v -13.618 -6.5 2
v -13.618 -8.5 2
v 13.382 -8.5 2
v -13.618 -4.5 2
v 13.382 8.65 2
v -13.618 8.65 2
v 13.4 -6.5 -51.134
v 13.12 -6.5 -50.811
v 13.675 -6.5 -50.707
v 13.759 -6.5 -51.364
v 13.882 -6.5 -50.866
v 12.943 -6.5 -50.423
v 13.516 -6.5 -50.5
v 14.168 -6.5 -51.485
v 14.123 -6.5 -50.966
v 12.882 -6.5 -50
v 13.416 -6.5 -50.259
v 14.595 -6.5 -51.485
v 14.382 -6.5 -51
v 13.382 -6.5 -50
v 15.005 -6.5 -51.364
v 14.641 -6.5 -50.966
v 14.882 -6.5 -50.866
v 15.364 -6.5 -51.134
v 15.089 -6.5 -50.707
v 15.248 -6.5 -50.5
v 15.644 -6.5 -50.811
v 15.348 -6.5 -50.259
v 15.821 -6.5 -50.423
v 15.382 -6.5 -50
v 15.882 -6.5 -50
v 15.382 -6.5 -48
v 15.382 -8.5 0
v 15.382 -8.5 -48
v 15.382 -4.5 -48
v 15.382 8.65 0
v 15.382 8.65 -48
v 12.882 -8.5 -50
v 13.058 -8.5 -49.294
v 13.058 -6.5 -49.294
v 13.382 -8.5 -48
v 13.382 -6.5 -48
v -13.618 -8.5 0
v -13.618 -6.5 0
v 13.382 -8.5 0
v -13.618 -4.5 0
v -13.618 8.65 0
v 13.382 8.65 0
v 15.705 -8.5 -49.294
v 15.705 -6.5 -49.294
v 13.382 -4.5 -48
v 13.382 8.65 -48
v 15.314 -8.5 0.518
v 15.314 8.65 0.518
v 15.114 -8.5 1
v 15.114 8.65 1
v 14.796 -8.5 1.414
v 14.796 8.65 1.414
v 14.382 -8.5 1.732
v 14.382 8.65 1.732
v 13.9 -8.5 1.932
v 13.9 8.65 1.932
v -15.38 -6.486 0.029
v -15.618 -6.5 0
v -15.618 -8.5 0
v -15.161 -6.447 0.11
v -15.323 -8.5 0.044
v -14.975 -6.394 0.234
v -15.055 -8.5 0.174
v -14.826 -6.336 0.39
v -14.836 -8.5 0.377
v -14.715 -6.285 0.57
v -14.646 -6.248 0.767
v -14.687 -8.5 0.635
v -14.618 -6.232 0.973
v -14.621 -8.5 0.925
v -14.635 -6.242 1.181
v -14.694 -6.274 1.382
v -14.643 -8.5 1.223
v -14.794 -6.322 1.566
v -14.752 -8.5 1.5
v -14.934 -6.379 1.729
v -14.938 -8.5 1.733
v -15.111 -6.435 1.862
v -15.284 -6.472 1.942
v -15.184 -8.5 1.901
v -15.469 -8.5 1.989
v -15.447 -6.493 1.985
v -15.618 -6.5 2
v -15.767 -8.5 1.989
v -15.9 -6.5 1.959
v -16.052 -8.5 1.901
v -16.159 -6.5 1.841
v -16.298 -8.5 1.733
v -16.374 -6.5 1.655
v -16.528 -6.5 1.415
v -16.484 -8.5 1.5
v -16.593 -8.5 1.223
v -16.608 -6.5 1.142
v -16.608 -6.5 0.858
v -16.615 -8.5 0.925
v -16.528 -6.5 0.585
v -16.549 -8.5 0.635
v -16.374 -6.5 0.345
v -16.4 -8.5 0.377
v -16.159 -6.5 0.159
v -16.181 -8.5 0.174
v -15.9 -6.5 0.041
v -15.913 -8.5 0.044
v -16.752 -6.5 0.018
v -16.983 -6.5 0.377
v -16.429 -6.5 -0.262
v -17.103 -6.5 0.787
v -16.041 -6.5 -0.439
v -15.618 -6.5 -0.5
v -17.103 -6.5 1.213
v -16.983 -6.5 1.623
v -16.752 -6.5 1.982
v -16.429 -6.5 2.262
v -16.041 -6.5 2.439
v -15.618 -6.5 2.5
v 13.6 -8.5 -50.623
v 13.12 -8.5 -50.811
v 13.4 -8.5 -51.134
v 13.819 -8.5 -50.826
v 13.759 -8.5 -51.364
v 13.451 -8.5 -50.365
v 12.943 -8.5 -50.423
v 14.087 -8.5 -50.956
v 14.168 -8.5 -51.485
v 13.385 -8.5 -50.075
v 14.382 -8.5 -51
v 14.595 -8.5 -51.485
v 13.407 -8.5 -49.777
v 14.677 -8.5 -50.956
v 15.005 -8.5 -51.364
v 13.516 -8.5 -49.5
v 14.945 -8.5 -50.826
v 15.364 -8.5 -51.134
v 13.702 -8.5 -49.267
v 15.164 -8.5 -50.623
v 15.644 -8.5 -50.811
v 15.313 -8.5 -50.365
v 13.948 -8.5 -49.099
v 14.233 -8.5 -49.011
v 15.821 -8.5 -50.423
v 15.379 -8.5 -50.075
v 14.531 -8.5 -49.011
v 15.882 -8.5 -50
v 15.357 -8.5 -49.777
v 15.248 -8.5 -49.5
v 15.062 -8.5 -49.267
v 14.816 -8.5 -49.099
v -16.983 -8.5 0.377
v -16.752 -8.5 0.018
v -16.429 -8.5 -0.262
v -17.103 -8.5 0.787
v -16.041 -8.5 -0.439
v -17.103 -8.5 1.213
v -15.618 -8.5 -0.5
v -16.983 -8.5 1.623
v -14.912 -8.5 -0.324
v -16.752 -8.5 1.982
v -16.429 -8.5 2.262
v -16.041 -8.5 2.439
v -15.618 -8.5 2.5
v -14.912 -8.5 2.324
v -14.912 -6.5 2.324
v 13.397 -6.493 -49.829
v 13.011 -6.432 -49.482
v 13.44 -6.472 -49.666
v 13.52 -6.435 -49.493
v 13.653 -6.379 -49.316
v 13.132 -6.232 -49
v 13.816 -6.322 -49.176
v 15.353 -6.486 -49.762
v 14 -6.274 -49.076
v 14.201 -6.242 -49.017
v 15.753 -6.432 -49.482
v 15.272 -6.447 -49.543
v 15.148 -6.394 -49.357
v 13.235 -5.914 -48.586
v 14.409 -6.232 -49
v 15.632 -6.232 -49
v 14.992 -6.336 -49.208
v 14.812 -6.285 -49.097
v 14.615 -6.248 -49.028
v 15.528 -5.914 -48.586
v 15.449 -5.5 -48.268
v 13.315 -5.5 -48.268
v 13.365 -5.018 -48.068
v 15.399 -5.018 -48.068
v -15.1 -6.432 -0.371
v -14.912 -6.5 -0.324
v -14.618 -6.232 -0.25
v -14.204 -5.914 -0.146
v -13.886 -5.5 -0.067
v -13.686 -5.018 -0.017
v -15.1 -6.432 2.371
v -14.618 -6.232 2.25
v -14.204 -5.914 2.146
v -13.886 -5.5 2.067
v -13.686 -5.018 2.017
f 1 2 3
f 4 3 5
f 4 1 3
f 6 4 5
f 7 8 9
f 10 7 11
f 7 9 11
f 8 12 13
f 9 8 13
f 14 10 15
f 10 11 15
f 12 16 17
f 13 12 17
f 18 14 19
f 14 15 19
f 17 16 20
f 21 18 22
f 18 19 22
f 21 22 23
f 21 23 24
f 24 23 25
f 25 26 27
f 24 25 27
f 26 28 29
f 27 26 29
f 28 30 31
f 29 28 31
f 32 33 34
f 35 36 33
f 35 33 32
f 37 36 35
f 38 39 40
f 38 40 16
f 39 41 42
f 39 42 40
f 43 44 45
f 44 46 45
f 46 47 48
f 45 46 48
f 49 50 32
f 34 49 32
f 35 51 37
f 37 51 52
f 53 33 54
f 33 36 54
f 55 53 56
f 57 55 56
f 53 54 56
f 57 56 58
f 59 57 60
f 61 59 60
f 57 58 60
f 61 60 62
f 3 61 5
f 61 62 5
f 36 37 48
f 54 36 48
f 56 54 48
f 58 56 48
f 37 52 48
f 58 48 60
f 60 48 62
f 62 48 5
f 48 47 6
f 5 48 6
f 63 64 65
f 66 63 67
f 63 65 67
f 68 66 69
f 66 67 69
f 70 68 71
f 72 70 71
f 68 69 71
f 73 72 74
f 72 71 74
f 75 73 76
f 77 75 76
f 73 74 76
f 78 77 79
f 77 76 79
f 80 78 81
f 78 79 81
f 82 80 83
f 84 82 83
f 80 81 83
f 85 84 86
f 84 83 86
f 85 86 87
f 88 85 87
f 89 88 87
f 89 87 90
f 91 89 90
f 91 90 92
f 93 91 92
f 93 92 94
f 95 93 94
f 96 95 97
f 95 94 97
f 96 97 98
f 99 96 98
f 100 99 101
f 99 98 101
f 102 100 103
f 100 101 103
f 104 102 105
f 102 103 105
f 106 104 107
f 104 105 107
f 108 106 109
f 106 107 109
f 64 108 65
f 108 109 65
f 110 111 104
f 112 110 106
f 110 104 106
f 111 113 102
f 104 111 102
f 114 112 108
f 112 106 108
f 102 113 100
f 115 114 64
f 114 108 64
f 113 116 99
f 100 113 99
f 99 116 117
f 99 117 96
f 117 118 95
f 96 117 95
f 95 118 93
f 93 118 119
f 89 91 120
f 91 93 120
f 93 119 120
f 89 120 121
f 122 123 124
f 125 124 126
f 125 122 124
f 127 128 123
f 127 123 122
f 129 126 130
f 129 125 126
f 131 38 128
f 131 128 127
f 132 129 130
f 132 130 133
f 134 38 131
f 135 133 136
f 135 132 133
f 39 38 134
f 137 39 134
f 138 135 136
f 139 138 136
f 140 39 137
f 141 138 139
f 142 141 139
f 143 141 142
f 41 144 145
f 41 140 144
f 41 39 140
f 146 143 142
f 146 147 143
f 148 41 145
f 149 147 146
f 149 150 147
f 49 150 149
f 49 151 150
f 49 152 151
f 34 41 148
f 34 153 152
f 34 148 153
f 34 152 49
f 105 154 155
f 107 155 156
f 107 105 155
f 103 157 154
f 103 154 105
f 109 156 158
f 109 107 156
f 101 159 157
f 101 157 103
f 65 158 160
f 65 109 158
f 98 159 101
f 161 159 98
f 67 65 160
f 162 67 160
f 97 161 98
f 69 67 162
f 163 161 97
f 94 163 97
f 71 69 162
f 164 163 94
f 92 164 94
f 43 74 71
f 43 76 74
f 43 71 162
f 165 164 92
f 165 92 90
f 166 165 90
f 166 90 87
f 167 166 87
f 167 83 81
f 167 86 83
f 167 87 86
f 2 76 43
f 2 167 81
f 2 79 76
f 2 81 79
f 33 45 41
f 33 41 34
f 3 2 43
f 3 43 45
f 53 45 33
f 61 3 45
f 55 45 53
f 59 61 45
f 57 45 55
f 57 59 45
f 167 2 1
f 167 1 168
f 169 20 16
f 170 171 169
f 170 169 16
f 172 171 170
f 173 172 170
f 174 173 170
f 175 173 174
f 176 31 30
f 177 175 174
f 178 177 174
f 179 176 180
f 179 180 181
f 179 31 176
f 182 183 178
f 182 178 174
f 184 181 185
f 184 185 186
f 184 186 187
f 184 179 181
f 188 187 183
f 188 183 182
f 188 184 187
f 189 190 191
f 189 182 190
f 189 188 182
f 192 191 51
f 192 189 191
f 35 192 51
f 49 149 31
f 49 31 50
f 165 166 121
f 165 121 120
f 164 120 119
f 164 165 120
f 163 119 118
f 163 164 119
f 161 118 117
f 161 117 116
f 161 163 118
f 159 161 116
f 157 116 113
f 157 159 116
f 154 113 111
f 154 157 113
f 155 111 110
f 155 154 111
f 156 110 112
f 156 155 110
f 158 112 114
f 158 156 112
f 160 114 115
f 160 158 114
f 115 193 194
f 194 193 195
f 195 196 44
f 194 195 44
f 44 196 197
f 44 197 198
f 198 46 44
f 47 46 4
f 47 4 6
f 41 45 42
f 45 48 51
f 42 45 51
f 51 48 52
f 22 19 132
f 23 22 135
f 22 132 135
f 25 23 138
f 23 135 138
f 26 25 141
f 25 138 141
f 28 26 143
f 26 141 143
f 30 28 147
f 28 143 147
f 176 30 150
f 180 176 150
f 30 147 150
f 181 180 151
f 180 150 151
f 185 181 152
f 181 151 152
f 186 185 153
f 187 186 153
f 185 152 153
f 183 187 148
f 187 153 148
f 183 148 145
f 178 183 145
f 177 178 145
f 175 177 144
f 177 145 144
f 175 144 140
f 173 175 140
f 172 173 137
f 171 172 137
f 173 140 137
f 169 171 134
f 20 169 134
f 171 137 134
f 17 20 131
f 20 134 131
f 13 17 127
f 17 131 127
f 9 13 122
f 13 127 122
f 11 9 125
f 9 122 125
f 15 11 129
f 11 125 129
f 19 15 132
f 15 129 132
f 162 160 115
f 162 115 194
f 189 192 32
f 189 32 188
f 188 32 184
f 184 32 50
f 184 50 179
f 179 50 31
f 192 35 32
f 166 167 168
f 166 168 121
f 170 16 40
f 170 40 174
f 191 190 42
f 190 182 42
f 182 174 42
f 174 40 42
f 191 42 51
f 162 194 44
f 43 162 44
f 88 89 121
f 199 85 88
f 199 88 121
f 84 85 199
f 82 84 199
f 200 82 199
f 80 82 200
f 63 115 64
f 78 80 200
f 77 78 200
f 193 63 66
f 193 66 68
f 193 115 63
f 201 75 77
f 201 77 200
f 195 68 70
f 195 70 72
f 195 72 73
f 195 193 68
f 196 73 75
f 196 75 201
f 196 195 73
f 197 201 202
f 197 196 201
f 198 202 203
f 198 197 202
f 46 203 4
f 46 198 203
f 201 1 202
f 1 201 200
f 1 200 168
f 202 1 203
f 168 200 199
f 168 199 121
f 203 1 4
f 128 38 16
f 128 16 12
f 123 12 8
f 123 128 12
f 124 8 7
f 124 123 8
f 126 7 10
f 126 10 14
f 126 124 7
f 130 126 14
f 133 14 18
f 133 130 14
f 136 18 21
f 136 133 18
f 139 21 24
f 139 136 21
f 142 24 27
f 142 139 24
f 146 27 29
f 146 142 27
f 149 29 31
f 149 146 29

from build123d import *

# Parameters (mm, degrees)
SKETCH2_W           = 27
SKETCH2_H           = 17.15
BOSS_EXTRUDE1_DEPTH = 2
SKETCH3_W           = 48
SKETCH3_H           = 17.15
SKETCH3_W_2         = 2
BOSS_EXTRUDE2_DEPTH = 2
FILLET1_R           = 2
SKETCH4_R           = 1
BOSS_EXTRUDE3_DEPTH = 2
FILLET2_R           = 2


with BuildPart() as part:
    # Sketch2 → Boss-Extrude1 (new body)
    with BuildSketch(Plane.XY):
        with Locations((-0.118075802, 0.075)):
            Rectangle(SKETCH2_W, SKETCH2_H)
    extrude(amount=BOSS_EXTRUDE1_DEPTH)

    # Sketch3 → Boss-Extrude2 (add)
    with BuildSketch(Plane(origin=(13.381924198, 0, 0), x_dir=(0, 0, -1), z_dir=(1, 0, 0))):
        with Locations((24, 0.075)):
            Rectangle(SKETCH3_W, SKETCH3_H)
        with Locations((-1, 0.075)):
            Rectangle(SKETCH3_W_2, SKETCH3_H)
    extrude(amount=BOSS_EXTRUDE2_DEPTH)

    # Fillet1
    fillet1_edges = [part.edges().sort_by_distance(p)[0] for p in [
        (15.381924198, 0.075, 2),
    ]]
    fillet(fillet1_edges, radius=FILLET1_R)

    # Sketch4 → Boss-Extrude3 (add)
    # profile 1 of 4: a face of its own
    with BuildSketch(Plane.XZ.offset(8.5)):
        with BuildLine():
            Line((13.381924198, -48), (13.058394786, -49.294117647))
            ThreePointArc((13.058394786, -49.294117647), (14.381924198, -48.5), (15.70545361, -49.294117647))
            Line((15.70545361, -49.294117647), (15.381924198, -48))
            Line((15.381924198, -48), (13.381924198, -48))
        make_face()
    # profile 2 of 4: a face of its own
    with BuildSketch(Plane.XZ.offset(8.5)):
        with BuildLine():
            Line((13.058394786, -49.294117647), (12.881924198, -50))
            ThreePointArc((12.881924198, -50), (14.381924198, -51.5), (15.881924198, -50))
            Line((15.881924198, -50), (15.70545361, -49.294117647))
            ThreePointArc((15.70545361, -49.294117647), (14.381924198, -48.5), (13.058394786, -49.294117647))
        make_face()
        with Locations(Location((14.381924198, -50, 0), (0, 0, 270))):
            Circle(SKETCH4_R, mode=Mode.SUBTRACT)
    # profile 3 of 4: a face of its own
    with BuildSketch(Plane.XZ.offset(8.5)):
        with BuildLine():
            Line((-15.618075802, -0.5), (-14.912193449, -0.323529412))
            ThreePointArc((-14.912193449, -0.323529412), (-14.331836413, 0.228256367), (-14.118075802, 1))
            ThreePointArc((-14.118075802, 1), (-14.331836413, 1.771743633), (-14.912193449, 2.323529412))
            Line((-14.912193449, 2.323529412), (-15.618075802, 2.5))
            ThreePointArc((-15.618075802, 2.5), (-17.118075802, 1), (-15.618075802, -0.5))
        make_face()
        with Locations(Location((-15.618075802, 1, 0), (0, 0, 270))):
            Circle(SKETCH4_R, mode=Mode.SUBTRACT)
    # profile 4 of 4: a face of its own
    with BuildSketch(Plane.XZ.offset(8.5)):
        with BuildLine():
            Line((-14.912193449, -0.323529412), (-13.618075802, 0))
            Line((-13.618075802, 0), (-13.618075802, 2))
            Line((-13.618075802, 2), (-14.912193449, 2.323529412))
            ThreePointArc((-14.912193449, 2.323529412), (-14.331836413, 1.771743633), (-14.118075802, 1))
            ThreePointArc((-14.118075802, 1), (-14.331836413, 0.228256367), (-14.912193449, -0.323529412))
        make_face()
    extrude(amount=-BOSS_EXTRUDE3_DEPTH)

    # Fillet2
    # the kernel refuses this fillet: 2 mm, written as the material it adds along each edge
    with BuildSketch(Plane(origin=(-13.618075802, -6.5, -5), x_dir=(0, 1, 0), z_dir=(0, 0, 1))) as fillet2_piece_1_section:
        with BuildLine():
            CenterArc((FILLET2_R, FILLET2_R), FILLET2_R, 180, 90)
            Line((0, FILLET2_R), (0, 0))
            Line((0, 0), (FILLET2_R, 0))
        make_face()
    fillet2_piece_1 = extrude(amount=12, mode=Mode.PRIVATE)
    fillet2_piece_1 = split(fillet2_piece_1, bisect_by=Plane(origin=(-13.669858881, -6.170840666, 2.01294577), z_dir=(-0.24253562503633297, 0, -0.9701425001453319)), keep=Keep.TOP, mode=Mode.PRIVATE)
    fillet2_piece_1 = split(fillet2_piece_1, bisect_by=Plane(origin=(-14.177655248, -6.170840666, -0.139894862), z_dir=(-0.24253562503633314, 0, 0.9701425001453319)), keep=Keep.TOP, mode=Mode.PRIVATE)
    fillet2_piece_1 = fillet2_piece_1 - Plane(origin=(-15.618075802, -6.170840666, 1), x_dir=(0, 0, -1), z_dir=(0, -1, 0)) * Cylinder(1, 32, mode=Mode.PRIVATE)
    add(fillet2_piece_1)
    with BuildSketch(Plane(origin=(20.381924198, -6.5, -48), x_dir=(0, 1, 0), z_dir=(-1, 0, 0))) as fillet2_piece_2_section:
        with BuildLine():
            CenterArc((FILLET2_R, FILLET2_R), FILLET2_R, 180, 90)
            Line((0, FILLET2_R), (0, 0))
            Line((0, 0), (FILLET2_R, 0))
        make_face()
    fillet2_piece_2 = extrude(amount=12, mode=Mode.PRIVATE)
    fillet2_piece_2 = split(fillet2_piece_2, bisect_by=Plane(origin=(15.52181906, -6.170840666, -48.559579447), z_dir=(-0.9701425001453322, 0, -0.24253562503633172)), keep=Keep.TOP, mode=Mode.PRIVATE)
    fillet2_piece_2 = split(fillet2_piece_2, bisect_by=Plane(origin=(13.368978429, -6.170840666, -48.051783079), z_dir=(0.9701425001453319, 0, -0.24253562503633297)), keep=Keep.TOP, mode=Mode.PRIVATE)
    fillet2_piece_2 = fillet2_piece_2 - Plane(origin=(14.381924198, -6.170840666, -50), x_dir=(0, 0, -1), z_dir=(0, -1, 0)) * Cylinder(1, 32, mode=Mode.PRIVATE)
    add(fillet2_piece_2)


solid = part.part
